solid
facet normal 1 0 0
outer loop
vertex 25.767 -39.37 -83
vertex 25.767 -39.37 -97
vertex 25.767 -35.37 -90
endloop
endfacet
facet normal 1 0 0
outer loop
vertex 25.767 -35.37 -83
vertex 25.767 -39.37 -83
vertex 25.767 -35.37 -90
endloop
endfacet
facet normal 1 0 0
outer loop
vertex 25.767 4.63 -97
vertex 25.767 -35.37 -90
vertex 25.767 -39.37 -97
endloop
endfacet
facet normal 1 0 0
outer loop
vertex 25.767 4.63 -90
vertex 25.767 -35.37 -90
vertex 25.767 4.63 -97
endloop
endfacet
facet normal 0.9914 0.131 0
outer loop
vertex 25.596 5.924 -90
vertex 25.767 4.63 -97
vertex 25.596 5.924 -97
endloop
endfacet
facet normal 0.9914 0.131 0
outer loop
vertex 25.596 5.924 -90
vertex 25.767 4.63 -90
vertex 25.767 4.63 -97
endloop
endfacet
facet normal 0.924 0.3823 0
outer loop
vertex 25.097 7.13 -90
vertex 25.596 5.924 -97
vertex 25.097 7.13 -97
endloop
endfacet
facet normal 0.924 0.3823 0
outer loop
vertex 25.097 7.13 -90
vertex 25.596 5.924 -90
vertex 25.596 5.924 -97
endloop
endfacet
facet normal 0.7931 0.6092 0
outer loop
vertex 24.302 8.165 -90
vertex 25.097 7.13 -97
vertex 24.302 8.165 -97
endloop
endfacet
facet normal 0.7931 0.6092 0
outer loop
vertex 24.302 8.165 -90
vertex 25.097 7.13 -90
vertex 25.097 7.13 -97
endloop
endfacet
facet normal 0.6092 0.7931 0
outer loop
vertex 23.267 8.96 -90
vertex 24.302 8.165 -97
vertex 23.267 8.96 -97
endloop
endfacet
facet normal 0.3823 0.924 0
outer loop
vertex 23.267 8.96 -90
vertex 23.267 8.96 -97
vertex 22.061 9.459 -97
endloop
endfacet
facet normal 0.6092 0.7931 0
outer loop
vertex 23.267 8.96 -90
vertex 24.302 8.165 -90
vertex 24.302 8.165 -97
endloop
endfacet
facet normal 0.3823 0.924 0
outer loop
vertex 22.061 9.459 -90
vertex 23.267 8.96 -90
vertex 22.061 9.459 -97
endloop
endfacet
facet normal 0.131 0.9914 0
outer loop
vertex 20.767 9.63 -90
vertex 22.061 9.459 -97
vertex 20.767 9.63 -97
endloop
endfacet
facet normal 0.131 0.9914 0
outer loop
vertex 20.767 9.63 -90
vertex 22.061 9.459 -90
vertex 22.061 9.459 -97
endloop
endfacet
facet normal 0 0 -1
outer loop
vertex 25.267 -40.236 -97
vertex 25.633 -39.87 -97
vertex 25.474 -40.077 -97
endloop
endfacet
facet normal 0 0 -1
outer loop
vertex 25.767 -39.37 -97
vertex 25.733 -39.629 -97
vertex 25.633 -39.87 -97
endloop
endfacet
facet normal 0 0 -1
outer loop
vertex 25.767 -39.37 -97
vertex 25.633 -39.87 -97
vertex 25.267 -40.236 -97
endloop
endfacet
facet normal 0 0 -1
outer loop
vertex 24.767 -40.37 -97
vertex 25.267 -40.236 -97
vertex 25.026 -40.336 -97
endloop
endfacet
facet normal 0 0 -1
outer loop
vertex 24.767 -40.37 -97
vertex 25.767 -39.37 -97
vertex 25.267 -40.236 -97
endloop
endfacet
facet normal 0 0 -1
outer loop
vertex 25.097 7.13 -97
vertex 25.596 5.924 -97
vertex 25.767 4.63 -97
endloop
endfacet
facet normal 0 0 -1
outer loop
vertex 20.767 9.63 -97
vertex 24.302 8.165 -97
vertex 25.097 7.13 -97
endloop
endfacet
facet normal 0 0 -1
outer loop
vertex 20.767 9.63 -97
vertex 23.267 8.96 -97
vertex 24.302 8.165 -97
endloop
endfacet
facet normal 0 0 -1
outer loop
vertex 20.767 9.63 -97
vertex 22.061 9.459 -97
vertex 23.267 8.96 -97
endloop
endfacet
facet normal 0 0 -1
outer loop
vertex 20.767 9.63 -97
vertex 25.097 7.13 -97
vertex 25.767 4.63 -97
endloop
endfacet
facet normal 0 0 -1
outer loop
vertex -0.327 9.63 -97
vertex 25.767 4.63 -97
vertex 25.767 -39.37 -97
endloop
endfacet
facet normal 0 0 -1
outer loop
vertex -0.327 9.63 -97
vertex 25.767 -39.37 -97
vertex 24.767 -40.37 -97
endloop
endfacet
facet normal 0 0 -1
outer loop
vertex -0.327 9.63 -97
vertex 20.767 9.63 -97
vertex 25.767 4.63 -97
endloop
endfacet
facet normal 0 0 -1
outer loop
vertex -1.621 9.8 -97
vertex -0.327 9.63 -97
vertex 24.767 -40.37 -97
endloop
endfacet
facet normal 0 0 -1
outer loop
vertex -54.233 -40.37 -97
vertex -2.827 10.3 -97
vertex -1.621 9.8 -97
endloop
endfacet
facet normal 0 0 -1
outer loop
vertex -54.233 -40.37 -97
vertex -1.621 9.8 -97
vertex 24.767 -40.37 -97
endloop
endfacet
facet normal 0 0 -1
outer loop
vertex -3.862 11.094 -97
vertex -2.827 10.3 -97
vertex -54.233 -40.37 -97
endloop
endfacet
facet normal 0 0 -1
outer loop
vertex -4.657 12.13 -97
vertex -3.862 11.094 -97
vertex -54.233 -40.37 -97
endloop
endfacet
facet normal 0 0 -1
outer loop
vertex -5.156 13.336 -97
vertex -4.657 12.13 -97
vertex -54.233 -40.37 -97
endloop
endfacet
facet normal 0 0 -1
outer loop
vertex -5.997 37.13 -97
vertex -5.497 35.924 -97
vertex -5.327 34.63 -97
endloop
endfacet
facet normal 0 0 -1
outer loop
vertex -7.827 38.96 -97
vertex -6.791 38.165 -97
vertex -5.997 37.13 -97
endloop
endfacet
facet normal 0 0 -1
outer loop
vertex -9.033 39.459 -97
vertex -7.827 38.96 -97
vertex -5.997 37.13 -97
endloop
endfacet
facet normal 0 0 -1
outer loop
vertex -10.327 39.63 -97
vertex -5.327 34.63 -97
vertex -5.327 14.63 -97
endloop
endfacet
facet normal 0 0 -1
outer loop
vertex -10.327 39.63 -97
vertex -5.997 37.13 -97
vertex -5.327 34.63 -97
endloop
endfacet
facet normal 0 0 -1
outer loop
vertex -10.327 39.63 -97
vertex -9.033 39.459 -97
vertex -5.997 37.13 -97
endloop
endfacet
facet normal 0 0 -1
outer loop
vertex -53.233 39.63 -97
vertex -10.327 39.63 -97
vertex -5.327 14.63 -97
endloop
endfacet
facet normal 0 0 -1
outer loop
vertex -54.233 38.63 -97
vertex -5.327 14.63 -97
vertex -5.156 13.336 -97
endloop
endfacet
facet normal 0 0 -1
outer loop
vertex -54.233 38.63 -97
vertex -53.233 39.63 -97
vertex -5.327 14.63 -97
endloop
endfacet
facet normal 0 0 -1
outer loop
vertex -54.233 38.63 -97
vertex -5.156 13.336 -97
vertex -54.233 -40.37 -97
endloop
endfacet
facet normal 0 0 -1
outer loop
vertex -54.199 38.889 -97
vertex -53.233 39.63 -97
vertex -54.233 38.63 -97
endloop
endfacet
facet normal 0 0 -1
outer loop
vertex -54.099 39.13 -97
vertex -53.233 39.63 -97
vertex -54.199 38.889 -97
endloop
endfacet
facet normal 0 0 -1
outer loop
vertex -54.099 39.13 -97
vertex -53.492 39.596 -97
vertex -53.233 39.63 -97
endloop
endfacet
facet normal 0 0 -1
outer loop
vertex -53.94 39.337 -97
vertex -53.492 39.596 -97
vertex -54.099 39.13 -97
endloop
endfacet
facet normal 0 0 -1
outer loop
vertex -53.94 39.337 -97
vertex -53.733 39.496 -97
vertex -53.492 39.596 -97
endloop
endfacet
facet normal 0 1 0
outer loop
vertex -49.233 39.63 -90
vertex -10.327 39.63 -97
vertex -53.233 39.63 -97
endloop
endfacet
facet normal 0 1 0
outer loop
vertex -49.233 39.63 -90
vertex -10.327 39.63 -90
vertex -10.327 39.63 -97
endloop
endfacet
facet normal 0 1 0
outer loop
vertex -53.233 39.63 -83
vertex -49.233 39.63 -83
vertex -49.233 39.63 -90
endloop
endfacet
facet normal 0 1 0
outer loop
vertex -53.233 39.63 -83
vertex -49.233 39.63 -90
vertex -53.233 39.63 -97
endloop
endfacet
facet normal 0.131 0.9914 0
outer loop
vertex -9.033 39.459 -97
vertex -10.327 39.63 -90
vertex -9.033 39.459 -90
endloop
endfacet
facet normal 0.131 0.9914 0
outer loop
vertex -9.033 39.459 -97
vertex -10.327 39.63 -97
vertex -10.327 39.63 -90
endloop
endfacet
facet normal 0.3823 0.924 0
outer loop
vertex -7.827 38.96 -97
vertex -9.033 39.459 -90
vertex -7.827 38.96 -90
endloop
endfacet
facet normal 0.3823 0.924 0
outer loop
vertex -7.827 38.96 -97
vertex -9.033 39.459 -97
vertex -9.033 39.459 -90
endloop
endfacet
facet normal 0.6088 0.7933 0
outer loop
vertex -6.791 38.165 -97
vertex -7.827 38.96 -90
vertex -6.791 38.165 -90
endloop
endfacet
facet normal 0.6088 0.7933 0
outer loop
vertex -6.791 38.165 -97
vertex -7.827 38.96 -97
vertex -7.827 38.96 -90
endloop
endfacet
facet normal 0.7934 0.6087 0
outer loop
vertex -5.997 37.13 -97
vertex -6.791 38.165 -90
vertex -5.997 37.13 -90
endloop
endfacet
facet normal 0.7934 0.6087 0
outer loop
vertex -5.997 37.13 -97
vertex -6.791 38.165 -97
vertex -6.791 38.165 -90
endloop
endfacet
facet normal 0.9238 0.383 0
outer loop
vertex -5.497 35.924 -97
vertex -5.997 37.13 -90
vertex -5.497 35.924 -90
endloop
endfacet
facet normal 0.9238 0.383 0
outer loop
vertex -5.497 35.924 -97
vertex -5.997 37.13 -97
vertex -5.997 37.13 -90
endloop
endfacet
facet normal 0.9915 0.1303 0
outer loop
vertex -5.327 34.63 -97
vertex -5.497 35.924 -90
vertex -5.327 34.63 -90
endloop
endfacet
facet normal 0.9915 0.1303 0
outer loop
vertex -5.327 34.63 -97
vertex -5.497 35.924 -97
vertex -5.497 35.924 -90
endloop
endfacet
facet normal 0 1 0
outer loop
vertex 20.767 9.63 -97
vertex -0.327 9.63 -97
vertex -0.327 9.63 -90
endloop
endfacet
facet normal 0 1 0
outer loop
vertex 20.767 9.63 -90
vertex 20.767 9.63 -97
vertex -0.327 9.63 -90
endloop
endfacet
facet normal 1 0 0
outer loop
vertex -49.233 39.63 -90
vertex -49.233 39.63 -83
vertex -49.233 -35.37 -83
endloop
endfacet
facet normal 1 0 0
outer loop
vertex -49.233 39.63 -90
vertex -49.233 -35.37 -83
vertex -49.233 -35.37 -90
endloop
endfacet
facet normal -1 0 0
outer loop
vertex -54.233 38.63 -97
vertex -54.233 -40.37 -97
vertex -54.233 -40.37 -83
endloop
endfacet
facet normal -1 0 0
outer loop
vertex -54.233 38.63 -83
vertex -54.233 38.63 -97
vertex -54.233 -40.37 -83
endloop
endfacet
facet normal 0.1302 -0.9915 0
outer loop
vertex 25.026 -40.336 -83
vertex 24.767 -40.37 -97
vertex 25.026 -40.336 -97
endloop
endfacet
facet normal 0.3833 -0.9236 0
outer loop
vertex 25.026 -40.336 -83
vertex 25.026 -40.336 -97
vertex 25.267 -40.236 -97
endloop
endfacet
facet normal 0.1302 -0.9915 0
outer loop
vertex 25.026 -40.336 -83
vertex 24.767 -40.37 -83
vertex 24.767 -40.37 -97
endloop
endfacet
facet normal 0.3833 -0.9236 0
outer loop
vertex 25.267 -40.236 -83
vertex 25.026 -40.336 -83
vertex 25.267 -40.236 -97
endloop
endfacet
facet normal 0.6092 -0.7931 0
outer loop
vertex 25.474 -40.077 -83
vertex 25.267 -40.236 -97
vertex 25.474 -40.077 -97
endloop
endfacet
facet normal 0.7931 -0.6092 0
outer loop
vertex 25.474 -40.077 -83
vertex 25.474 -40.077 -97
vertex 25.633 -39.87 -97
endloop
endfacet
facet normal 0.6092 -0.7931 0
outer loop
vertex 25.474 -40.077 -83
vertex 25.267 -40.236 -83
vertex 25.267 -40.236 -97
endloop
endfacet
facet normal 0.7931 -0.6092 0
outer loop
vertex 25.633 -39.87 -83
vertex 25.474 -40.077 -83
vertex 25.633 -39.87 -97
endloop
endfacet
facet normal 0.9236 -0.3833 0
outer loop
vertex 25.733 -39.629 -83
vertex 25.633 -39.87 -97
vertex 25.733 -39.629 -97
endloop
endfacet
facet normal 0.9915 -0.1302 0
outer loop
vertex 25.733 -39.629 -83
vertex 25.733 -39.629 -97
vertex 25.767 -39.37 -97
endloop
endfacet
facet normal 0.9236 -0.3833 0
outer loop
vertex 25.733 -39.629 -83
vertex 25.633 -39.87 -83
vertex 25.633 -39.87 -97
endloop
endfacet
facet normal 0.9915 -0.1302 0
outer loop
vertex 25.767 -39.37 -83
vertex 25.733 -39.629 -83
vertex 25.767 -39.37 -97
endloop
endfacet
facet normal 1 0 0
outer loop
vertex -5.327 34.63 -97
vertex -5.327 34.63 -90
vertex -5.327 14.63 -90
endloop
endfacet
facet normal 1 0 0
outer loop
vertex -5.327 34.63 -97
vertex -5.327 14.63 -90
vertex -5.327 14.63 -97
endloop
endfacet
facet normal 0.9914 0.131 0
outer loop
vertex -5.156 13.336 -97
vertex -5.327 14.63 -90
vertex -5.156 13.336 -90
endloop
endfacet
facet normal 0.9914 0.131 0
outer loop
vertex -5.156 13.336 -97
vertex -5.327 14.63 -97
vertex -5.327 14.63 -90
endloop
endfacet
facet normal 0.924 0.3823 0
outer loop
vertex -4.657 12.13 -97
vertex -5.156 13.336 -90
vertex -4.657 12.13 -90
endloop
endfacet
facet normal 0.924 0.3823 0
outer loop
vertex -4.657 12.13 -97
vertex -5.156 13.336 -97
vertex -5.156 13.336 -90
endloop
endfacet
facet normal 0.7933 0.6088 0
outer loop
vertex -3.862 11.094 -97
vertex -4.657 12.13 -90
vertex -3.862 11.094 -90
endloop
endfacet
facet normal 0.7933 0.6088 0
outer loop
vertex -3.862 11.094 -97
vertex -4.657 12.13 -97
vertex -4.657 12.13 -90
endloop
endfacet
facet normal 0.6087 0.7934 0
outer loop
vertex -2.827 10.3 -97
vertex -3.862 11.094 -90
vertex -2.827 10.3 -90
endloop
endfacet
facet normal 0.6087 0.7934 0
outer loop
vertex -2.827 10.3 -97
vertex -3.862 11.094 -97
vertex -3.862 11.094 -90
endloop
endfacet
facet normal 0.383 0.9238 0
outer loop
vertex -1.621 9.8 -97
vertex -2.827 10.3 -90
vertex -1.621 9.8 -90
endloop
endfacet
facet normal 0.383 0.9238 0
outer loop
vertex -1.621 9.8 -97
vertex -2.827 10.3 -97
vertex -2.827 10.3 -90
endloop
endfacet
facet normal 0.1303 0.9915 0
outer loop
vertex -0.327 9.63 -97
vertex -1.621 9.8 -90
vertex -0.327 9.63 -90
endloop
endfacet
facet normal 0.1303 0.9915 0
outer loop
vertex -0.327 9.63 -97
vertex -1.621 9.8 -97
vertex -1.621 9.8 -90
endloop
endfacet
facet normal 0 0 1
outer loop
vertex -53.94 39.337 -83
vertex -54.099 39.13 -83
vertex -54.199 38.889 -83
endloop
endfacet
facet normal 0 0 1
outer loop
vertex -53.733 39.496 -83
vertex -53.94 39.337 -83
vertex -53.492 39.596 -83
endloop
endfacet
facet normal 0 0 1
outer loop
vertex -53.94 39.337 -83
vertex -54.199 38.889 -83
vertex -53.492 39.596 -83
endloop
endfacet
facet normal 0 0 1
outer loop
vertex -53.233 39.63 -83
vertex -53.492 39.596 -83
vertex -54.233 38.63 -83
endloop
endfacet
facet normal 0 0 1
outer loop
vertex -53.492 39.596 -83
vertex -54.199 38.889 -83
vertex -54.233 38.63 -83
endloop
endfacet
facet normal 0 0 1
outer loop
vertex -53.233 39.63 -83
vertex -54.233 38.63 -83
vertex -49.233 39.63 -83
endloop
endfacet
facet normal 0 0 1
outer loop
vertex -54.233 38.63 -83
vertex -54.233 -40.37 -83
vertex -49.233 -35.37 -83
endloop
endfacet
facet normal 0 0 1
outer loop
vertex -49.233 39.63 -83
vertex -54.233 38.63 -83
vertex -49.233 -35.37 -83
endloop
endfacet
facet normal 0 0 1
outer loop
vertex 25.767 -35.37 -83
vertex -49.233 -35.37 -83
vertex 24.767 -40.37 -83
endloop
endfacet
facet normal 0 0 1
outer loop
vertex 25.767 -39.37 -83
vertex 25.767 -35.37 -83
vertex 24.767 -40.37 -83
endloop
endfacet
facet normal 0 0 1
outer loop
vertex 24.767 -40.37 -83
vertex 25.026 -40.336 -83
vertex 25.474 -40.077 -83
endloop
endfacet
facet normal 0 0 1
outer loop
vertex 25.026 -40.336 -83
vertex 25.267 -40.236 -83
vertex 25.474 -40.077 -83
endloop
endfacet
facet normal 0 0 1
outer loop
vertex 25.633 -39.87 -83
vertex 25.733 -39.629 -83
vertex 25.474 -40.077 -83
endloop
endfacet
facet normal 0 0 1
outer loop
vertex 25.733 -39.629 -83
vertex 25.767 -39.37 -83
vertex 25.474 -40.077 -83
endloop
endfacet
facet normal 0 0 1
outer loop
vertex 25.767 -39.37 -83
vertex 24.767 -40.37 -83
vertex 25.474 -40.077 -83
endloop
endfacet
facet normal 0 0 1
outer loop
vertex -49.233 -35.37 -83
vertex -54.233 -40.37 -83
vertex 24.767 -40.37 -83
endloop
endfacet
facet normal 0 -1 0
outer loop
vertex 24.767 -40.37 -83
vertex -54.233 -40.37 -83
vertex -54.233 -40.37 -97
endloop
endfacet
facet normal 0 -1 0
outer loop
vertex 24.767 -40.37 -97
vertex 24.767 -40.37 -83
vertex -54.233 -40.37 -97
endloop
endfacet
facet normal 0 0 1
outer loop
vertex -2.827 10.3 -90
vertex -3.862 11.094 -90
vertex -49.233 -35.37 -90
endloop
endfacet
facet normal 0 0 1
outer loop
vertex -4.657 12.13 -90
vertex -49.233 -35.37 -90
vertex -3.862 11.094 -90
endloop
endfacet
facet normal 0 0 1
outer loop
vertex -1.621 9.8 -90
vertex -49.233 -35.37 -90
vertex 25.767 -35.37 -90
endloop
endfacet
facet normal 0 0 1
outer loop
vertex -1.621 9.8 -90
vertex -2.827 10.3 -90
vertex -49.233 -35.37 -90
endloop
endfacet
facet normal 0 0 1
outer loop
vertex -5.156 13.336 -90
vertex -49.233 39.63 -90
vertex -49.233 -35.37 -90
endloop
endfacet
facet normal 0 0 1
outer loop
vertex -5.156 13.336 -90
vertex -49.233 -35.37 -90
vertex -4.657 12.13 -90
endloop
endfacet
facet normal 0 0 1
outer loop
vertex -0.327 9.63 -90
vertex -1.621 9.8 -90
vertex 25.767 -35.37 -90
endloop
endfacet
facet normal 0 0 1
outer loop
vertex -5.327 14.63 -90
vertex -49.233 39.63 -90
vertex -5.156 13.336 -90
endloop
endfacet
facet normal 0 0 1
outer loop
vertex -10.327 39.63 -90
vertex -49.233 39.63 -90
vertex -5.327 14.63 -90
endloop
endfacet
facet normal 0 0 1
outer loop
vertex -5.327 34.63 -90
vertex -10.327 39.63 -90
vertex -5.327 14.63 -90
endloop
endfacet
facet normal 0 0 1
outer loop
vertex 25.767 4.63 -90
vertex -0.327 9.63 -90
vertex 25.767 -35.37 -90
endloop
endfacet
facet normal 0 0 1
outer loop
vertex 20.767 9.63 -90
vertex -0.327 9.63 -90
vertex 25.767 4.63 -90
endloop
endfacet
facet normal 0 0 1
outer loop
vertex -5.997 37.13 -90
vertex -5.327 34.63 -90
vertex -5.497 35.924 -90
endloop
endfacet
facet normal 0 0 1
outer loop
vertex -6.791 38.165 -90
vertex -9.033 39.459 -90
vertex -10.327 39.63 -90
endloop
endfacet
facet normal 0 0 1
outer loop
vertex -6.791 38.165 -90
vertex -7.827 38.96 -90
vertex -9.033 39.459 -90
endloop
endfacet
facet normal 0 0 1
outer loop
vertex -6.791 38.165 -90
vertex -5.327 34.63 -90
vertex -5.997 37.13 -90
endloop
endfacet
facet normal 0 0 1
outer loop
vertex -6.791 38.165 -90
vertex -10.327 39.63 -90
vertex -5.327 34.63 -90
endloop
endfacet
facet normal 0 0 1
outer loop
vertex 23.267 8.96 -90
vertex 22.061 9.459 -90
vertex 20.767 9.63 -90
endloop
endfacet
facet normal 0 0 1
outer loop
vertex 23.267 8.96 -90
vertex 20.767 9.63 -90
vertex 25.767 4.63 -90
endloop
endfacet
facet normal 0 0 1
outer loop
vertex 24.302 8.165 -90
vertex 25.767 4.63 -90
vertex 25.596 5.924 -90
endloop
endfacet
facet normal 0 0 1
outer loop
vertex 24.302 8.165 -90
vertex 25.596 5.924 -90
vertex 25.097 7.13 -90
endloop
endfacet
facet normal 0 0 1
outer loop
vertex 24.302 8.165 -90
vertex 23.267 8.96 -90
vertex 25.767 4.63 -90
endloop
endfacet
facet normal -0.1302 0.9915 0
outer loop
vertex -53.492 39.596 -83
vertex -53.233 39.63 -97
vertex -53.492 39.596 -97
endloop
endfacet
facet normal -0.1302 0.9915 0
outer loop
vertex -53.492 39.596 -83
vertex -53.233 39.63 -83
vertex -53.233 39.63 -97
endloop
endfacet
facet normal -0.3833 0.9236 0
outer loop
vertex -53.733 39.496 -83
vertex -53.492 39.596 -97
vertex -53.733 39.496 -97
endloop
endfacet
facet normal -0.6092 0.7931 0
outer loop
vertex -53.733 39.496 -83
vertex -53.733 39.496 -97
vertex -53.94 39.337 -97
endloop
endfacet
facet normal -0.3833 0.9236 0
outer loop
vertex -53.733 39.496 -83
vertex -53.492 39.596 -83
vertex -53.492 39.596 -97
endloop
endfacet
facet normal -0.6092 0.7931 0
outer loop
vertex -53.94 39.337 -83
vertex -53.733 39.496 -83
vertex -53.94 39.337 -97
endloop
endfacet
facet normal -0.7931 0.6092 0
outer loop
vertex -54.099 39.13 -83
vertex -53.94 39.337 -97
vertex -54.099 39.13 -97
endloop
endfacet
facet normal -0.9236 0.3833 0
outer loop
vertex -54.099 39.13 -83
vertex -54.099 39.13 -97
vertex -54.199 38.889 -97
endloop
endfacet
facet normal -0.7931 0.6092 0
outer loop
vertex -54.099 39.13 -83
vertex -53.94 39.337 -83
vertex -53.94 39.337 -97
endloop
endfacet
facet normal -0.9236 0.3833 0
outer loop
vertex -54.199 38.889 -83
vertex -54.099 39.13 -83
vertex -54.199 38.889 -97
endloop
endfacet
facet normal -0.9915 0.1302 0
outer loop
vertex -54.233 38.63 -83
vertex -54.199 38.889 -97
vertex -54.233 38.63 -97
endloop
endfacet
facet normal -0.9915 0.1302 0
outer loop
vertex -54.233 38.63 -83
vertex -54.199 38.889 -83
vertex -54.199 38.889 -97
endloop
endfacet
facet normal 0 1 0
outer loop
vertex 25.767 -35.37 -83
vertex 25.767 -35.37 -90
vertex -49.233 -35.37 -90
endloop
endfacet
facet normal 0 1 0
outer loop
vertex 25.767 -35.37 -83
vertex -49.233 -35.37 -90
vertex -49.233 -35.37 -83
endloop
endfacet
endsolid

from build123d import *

# Parameters (mm, degrees)
F1_DEPTH  = 80
F3_DEPTH  = 75
F5_DEPTH  = 80
F7_DEPTH  = 80
F9_W      = 115.3811365366
F9_H      = 141.341894865
F10_DEPTH = 97.9
F11_R     = 5
F12_R     = 1


with BuildPart() as f1:
    # F0 (on Top) → F1 (new body)
    with BuildSketch(Plane.XY):
        Polygon((-41.2332489645, 39.6297108009), (-54.2332489645, 39.6297108009), (-54.2332489645, -40.3702891991), (25.7667510355, -40.3702891991), (25.7667510355, -27.3702891991), (-41.2332489645, -27.3702891991), align=None)
    extrude(amount=-F1_DEPTH)

    # F2 (on face) → F3 (cut)
    with BuildSketch(Plane.XY):
        Polygon((-44.2332489645, 39.6297108009), (-51.2332489645, 39.6297108009), (-51.2332489645, -37.3702891991), (25.7667510355, -37.3702891991), (25.7667510355, -30.3702891991), (-44.2332489645, -30.3702891991), align=None)
    extrude(amount=-F3_DEPTH, mode=Mode.SUBTRACT)

    # F4 (on face) → F5 (join)
    with BuildSketch(Plane.YZ.offset(25.7667510355)):
        Polygon((-27.3702891991, -80), (-40.3702891991, -80), (-40.3702891991, -97), (9.6297108009, -97), (9.6297108009, -90), (-35.3702891991, -90), (-35.3702891991, -83), (-20.3702891991, -83), (-20.3702891991, -80), align=None)
    extrude(amount=-F5_DEPTH)

    # F6 (on face) → F7 (join)
    with BuildSketch(Plane(origin=(0, 39.6297108009, 0), x_dir=(-1, 0, 0), z_dir=(0, 1, 0))):
        Polygon((54.2332489645, -80), (34.2332489645, -80), (34.2332489645, -83), (49.2332489645, -83), (49.2332489645, -90), (5.3266771138, -90), (5.3266771138, -97), (41.2332489645, -97), (54.2332489645, -97), align=None)
    extrude(amount=-F7_DEPTH)

    # F9 (on offset) → F10 (cut)
    with BuildSketch(Plane(origin=(0, 0, -83), x_dir=(1, 0, 0), z_dir=(0, 0, -1))):
        with Locations((-4.7438181937, -3.1282007694)):
            Rectangle(F9_W, F9_H)
    extrude(amount=-F10_DEPTH, mode=Mode.SUBTRACT)

    # F11
    f11_edges = [f1.edges().sort_by_distance(p)[0] for p in [
        (-5.326677, 9.629711, -93.5),
        (-5.326677, 39.629711, -93.5),
        (25.766751, 9.629711, -93.5),
    ]]
    fillet(f11_edges, radius=F11_R)

    # F12
    f12_edges = [f1.edges().sort_by_distance(p)[0] for p in [
        (25.766751, -40.370289, -90),
        (-54.233249, 39.629711, -90),
    ]]
    fillet(f12_edges, radius=F12_R)


solid = f1.part
